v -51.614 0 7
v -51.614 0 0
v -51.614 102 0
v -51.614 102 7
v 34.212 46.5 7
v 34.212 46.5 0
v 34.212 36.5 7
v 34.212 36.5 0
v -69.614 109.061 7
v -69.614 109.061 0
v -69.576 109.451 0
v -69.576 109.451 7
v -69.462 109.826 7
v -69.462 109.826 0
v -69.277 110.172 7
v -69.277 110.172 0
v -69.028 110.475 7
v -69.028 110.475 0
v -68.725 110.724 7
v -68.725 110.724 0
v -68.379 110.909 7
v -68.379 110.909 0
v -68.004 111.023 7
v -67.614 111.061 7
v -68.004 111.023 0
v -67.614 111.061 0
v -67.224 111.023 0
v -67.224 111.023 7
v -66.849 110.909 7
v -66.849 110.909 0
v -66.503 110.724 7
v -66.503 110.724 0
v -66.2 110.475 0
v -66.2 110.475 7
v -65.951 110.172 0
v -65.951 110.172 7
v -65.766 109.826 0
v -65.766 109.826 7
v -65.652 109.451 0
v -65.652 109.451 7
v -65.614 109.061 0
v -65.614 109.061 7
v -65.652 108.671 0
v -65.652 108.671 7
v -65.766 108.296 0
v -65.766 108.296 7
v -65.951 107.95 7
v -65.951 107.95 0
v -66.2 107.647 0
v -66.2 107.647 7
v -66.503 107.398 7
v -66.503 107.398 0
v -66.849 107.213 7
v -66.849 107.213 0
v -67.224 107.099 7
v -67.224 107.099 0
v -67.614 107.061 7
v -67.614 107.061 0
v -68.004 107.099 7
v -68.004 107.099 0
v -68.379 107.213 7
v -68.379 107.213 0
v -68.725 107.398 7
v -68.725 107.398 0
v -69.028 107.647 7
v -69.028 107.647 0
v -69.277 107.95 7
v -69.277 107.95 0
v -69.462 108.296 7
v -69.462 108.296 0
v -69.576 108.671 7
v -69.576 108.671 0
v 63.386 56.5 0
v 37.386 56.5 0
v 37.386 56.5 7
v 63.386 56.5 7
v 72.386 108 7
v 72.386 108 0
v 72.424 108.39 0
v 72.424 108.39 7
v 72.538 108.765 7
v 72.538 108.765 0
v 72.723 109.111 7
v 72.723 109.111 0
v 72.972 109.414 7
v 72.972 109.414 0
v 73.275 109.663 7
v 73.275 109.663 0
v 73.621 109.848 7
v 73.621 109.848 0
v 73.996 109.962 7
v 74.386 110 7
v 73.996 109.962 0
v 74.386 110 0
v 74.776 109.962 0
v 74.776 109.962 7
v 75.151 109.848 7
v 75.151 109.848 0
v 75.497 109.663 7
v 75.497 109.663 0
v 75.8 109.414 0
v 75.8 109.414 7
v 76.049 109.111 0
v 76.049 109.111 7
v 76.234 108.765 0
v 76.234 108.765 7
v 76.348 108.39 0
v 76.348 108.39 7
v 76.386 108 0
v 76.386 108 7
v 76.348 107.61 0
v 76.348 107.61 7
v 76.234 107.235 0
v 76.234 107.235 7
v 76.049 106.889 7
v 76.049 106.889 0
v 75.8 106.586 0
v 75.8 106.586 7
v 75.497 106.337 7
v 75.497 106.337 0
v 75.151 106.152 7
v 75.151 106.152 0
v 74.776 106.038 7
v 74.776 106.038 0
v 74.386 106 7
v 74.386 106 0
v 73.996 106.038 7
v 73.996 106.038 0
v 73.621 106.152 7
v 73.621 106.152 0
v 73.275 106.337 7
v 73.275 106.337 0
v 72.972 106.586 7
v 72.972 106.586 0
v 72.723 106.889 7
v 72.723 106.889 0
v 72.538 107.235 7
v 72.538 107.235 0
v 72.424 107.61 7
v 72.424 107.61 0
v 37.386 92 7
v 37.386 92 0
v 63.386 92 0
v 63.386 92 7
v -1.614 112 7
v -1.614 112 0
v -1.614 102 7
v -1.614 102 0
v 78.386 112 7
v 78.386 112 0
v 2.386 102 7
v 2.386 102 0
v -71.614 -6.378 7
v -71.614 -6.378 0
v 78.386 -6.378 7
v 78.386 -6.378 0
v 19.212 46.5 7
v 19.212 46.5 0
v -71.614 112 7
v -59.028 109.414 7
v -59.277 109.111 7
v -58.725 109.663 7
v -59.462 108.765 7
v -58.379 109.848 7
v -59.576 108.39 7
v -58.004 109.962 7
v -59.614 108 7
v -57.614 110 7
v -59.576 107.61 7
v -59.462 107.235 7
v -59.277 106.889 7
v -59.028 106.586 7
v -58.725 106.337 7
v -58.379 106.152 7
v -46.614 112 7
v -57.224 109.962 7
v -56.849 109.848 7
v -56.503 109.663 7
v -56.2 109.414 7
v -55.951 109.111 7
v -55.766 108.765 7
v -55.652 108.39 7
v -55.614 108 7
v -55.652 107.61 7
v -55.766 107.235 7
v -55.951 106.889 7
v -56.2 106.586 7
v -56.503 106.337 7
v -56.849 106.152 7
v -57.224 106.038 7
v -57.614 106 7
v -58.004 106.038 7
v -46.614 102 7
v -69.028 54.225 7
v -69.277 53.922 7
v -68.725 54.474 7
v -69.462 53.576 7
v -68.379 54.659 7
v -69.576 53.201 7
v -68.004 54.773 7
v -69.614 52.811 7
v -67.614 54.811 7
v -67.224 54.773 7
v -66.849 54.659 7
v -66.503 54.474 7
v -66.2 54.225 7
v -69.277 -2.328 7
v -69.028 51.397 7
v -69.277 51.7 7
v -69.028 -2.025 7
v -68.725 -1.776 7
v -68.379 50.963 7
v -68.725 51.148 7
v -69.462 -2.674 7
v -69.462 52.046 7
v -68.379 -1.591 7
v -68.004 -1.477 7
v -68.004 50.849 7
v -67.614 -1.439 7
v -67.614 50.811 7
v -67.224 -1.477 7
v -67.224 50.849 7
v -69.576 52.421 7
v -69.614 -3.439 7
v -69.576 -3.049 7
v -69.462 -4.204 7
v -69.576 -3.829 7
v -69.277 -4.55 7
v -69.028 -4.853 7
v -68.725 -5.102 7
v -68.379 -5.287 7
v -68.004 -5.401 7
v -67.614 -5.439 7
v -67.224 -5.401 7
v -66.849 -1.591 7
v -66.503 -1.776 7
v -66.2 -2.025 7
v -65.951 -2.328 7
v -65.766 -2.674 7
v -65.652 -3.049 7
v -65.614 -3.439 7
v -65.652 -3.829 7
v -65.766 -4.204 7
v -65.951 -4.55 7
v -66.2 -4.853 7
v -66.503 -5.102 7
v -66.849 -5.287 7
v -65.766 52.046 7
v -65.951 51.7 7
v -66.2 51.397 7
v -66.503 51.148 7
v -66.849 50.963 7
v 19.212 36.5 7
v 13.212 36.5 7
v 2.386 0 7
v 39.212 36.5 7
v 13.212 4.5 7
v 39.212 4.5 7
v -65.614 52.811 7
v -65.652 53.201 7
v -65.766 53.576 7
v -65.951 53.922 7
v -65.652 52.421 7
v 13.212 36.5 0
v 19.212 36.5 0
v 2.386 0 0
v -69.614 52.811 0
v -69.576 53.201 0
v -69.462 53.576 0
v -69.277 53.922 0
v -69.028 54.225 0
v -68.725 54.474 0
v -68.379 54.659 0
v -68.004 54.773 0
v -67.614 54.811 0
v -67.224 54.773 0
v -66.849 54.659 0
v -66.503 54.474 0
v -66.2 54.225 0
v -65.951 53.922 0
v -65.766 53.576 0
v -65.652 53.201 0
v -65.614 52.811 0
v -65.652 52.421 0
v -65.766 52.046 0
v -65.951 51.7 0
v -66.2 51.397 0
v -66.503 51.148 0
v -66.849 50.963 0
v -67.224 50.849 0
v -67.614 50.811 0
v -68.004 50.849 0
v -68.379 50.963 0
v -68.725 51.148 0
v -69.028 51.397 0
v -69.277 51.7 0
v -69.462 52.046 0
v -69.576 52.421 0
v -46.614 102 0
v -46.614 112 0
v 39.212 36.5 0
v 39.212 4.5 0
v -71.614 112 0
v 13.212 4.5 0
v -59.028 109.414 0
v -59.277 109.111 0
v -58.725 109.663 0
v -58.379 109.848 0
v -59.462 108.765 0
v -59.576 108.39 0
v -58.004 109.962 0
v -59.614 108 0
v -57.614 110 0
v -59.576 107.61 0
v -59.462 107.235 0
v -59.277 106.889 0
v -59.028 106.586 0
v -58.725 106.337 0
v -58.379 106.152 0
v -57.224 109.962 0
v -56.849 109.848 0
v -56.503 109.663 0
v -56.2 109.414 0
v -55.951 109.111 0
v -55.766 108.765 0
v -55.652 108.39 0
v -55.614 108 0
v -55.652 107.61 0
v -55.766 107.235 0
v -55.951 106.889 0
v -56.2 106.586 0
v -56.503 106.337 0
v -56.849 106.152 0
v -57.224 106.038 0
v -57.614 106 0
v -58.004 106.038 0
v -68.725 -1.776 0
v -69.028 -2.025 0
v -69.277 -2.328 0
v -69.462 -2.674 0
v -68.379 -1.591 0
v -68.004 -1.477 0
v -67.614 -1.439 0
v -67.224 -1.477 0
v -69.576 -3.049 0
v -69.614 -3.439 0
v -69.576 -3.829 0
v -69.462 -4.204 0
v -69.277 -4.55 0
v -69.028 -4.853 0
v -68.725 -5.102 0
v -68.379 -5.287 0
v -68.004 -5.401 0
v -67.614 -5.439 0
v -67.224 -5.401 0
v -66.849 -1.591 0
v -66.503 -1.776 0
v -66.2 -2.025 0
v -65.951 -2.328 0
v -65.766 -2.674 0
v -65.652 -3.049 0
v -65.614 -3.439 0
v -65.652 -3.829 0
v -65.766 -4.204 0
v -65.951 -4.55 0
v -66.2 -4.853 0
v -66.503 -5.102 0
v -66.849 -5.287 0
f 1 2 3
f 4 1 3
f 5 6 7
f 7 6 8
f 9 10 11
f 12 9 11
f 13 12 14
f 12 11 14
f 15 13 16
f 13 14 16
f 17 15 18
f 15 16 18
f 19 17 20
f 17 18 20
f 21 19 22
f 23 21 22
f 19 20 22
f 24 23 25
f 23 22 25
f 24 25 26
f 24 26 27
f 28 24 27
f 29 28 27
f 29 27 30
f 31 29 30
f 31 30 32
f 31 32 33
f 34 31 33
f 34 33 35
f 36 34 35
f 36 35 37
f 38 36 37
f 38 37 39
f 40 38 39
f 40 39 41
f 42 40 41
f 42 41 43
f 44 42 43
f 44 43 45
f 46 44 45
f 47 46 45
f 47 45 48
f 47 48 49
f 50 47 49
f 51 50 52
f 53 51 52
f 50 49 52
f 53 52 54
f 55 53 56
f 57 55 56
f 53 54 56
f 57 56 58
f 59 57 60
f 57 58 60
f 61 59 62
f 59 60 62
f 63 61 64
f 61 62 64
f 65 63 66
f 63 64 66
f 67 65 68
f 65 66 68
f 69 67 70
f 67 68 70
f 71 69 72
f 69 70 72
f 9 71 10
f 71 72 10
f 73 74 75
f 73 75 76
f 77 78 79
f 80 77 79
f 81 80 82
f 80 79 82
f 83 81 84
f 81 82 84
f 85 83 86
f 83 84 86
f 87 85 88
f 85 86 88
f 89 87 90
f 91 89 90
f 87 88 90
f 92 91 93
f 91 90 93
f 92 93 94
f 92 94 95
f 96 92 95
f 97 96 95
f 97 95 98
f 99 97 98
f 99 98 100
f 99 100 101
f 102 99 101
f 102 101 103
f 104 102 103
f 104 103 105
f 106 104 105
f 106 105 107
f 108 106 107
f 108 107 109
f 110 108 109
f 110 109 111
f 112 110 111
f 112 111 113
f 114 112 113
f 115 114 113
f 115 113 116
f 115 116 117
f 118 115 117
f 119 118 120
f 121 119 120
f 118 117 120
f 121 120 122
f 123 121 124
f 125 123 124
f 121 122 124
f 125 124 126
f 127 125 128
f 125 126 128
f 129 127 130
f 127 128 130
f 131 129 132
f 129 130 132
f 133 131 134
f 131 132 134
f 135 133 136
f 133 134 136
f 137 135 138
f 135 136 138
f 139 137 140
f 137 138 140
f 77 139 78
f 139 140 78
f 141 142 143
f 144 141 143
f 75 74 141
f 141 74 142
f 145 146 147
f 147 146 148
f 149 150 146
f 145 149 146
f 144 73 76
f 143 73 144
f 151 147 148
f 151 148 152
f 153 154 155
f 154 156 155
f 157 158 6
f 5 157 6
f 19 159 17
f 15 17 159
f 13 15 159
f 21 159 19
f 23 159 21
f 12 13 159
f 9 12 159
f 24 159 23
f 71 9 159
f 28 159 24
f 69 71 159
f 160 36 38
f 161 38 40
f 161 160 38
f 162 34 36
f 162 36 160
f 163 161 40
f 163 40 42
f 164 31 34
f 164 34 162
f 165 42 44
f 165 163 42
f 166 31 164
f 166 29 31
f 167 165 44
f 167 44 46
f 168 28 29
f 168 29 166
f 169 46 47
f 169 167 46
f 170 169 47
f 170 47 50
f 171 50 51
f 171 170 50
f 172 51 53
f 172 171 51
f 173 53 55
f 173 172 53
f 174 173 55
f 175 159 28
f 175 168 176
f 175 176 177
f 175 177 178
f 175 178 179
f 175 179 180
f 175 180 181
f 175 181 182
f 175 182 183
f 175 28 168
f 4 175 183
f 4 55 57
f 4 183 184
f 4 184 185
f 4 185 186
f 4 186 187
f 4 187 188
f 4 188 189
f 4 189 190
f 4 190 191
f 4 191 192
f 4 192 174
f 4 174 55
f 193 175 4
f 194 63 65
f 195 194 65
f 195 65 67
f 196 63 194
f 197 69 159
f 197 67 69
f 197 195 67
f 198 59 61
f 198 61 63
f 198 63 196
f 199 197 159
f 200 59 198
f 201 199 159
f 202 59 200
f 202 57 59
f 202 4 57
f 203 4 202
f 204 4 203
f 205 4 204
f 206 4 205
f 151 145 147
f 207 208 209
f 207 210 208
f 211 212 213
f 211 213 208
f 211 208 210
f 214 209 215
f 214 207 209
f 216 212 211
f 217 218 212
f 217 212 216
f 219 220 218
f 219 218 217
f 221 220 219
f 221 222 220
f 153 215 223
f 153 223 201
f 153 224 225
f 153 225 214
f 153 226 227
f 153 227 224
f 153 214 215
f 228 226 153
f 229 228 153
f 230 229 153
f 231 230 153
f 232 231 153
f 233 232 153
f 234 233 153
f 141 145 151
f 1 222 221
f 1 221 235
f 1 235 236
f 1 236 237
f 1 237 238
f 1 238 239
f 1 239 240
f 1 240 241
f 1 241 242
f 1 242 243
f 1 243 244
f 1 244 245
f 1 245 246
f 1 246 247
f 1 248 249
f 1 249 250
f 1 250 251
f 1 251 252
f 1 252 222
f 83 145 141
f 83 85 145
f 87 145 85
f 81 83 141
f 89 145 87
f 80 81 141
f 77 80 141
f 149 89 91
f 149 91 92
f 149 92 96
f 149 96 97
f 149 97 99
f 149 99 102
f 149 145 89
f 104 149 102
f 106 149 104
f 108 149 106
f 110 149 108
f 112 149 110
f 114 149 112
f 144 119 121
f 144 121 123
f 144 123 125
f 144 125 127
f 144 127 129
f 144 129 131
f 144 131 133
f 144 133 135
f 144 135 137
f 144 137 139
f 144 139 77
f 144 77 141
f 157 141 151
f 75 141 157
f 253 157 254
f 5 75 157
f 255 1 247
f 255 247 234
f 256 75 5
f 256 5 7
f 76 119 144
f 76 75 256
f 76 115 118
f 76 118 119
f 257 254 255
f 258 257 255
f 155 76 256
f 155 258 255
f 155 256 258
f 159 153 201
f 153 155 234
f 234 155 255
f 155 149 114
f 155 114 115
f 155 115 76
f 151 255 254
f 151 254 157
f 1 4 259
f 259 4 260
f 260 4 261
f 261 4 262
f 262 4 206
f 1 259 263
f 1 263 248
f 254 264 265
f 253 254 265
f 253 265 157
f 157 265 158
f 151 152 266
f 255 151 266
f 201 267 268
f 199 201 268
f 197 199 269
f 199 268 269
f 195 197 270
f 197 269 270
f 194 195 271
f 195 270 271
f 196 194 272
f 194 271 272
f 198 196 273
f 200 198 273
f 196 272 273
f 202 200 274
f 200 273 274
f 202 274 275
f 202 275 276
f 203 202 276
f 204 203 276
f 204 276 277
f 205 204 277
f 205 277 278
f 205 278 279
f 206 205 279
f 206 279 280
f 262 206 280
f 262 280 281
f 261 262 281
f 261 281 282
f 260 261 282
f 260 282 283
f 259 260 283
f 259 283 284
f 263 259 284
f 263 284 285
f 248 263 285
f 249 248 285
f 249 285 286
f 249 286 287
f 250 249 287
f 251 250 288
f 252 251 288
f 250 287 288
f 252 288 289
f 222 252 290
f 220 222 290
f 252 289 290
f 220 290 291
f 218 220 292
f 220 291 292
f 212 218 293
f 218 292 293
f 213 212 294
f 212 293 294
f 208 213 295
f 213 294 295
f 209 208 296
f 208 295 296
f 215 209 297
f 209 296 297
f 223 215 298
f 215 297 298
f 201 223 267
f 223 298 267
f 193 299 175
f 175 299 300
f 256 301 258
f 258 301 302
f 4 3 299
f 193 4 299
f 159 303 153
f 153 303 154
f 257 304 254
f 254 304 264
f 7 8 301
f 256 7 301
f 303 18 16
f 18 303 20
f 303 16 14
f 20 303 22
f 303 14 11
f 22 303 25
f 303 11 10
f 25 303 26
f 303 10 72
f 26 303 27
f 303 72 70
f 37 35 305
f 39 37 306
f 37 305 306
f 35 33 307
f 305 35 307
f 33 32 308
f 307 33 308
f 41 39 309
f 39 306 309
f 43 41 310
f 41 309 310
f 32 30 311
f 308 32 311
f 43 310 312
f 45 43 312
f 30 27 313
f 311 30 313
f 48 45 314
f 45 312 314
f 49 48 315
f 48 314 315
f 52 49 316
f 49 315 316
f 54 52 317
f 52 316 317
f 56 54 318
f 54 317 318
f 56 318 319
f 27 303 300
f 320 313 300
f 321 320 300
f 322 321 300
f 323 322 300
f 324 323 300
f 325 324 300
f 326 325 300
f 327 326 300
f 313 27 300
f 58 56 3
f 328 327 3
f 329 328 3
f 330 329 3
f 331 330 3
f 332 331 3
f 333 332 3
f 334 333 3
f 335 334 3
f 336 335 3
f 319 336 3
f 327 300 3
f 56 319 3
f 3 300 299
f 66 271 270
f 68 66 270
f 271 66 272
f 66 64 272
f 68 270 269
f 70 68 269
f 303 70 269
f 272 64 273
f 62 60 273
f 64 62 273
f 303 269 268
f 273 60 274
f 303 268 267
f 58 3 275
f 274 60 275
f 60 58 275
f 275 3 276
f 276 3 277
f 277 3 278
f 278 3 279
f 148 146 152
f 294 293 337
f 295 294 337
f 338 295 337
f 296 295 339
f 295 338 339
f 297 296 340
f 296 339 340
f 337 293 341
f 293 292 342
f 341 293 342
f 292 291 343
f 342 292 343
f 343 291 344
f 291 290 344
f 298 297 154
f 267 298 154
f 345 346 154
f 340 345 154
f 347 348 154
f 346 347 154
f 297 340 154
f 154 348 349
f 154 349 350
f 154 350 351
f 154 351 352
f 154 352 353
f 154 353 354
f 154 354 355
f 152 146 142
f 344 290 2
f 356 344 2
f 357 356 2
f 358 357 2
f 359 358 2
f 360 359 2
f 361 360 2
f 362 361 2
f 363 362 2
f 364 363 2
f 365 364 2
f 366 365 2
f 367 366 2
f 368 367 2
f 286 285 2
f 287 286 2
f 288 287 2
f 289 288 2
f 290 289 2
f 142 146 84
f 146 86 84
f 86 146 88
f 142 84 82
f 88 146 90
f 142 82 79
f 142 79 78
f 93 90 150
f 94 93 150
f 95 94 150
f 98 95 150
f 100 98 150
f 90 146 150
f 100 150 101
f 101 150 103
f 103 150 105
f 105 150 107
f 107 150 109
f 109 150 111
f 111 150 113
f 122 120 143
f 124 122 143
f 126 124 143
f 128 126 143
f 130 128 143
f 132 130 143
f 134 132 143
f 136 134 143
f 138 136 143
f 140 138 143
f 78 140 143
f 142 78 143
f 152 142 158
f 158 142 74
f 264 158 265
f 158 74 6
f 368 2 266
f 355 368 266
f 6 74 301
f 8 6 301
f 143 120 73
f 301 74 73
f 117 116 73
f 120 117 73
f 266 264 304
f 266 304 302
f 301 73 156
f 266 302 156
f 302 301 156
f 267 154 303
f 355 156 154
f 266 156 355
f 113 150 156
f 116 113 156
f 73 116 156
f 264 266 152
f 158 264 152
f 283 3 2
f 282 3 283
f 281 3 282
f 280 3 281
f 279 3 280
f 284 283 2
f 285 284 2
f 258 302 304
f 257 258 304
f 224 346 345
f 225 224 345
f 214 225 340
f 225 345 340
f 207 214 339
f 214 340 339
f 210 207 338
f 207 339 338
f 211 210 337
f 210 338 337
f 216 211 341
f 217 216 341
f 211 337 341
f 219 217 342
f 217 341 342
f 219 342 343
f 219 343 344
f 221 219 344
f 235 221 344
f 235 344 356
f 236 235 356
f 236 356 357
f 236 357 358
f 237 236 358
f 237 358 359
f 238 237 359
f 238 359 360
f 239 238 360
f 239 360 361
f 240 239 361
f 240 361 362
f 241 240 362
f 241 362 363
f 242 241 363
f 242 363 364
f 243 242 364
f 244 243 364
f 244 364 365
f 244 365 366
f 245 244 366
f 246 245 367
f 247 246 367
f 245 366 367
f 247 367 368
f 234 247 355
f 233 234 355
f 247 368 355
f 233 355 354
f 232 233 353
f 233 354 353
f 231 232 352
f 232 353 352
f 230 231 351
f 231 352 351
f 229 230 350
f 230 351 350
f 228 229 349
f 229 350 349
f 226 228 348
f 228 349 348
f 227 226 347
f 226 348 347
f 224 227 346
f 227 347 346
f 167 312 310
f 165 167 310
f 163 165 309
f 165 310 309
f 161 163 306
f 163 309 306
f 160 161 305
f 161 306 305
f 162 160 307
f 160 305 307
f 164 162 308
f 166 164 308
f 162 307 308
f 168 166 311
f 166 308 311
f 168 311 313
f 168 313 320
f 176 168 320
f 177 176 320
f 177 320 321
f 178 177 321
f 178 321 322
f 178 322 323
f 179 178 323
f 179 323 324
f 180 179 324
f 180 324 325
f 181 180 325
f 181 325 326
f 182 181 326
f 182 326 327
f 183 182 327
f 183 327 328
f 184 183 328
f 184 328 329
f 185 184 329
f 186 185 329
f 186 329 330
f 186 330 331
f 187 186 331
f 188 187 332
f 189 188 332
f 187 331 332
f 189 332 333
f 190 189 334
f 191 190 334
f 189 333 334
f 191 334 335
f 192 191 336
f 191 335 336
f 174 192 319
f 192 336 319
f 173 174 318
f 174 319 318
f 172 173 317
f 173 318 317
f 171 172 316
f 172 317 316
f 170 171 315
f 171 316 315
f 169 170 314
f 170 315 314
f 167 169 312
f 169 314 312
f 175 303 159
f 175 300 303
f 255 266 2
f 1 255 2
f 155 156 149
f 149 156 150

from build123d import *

# Parameters (mm, degrees)
F0_W     = 26
F0_H     = 35.5
F1_DEPTH = 7
F4_D     = 4
F5_DEPTH = 10
F7_D     = 4


with BuildPart() as f1:
    # F0 (on Top) → F1 (new body)
    with BuildSketch(Plane.XY):
        Polygon((-46.6139434278, 112), (-61.6139434278, 112), (-61.6139434278, -6.3780904748), (78.3860565722, -6.3780904748), (78.3860565722, 112), (-1.6139434278, 112), (-1.6139434278, 102), (2.3860565722, 102), (2.3860565722, 0), (-51.6139434278, 0), (-51.6139434278, 102), (-46.6139434278, 102), align=None)
        Polygon((13.2124200463, 4.5), (13.2124200463, 36.5), (19.2124200463, 36.5), (19.2124200463, 46.5), (34.2124200463, 46.5), (34.2124200463, 36.5), (39.2124200463, 36.5), (39.2124200463, 4.5), align=None, mode=Mode.SUBTRACT)
        with Locations((50.3860565722, 74.25)):
            Rectangle(F0_W, F0_H, mode=Mode.SUBTRACT)
    extrude(amount=F1_DEPTH)

    # F4 (through all)
    with Locations(Plane.XY.offset(7)):
        with Locations((74.3860565722, 108), (-57.6139434278, 108), (-57.6139434278, 116), (74.3860565722, 116)):
            Hole(F4_D / 2)

    # F5 (add): a face of the model
    f5_faces = [f1.faces().sort_by_distance(p)[0] for p in [
        (-61.6139434278, 52.8109547626, 3.5),
    ]]
    extrude(f5_faces, amount=F5_DEPTH)

    # F7 (through all)
    with Locations(Plane.XY.offset(7)):
        with Locations((-67.6139434278, 109.0609547626), (-67.6139434278, 52.8109547626), (-67.6139434278, -3.4390452374)):
            Hole(F7_D / 2)


solid = f1.part
